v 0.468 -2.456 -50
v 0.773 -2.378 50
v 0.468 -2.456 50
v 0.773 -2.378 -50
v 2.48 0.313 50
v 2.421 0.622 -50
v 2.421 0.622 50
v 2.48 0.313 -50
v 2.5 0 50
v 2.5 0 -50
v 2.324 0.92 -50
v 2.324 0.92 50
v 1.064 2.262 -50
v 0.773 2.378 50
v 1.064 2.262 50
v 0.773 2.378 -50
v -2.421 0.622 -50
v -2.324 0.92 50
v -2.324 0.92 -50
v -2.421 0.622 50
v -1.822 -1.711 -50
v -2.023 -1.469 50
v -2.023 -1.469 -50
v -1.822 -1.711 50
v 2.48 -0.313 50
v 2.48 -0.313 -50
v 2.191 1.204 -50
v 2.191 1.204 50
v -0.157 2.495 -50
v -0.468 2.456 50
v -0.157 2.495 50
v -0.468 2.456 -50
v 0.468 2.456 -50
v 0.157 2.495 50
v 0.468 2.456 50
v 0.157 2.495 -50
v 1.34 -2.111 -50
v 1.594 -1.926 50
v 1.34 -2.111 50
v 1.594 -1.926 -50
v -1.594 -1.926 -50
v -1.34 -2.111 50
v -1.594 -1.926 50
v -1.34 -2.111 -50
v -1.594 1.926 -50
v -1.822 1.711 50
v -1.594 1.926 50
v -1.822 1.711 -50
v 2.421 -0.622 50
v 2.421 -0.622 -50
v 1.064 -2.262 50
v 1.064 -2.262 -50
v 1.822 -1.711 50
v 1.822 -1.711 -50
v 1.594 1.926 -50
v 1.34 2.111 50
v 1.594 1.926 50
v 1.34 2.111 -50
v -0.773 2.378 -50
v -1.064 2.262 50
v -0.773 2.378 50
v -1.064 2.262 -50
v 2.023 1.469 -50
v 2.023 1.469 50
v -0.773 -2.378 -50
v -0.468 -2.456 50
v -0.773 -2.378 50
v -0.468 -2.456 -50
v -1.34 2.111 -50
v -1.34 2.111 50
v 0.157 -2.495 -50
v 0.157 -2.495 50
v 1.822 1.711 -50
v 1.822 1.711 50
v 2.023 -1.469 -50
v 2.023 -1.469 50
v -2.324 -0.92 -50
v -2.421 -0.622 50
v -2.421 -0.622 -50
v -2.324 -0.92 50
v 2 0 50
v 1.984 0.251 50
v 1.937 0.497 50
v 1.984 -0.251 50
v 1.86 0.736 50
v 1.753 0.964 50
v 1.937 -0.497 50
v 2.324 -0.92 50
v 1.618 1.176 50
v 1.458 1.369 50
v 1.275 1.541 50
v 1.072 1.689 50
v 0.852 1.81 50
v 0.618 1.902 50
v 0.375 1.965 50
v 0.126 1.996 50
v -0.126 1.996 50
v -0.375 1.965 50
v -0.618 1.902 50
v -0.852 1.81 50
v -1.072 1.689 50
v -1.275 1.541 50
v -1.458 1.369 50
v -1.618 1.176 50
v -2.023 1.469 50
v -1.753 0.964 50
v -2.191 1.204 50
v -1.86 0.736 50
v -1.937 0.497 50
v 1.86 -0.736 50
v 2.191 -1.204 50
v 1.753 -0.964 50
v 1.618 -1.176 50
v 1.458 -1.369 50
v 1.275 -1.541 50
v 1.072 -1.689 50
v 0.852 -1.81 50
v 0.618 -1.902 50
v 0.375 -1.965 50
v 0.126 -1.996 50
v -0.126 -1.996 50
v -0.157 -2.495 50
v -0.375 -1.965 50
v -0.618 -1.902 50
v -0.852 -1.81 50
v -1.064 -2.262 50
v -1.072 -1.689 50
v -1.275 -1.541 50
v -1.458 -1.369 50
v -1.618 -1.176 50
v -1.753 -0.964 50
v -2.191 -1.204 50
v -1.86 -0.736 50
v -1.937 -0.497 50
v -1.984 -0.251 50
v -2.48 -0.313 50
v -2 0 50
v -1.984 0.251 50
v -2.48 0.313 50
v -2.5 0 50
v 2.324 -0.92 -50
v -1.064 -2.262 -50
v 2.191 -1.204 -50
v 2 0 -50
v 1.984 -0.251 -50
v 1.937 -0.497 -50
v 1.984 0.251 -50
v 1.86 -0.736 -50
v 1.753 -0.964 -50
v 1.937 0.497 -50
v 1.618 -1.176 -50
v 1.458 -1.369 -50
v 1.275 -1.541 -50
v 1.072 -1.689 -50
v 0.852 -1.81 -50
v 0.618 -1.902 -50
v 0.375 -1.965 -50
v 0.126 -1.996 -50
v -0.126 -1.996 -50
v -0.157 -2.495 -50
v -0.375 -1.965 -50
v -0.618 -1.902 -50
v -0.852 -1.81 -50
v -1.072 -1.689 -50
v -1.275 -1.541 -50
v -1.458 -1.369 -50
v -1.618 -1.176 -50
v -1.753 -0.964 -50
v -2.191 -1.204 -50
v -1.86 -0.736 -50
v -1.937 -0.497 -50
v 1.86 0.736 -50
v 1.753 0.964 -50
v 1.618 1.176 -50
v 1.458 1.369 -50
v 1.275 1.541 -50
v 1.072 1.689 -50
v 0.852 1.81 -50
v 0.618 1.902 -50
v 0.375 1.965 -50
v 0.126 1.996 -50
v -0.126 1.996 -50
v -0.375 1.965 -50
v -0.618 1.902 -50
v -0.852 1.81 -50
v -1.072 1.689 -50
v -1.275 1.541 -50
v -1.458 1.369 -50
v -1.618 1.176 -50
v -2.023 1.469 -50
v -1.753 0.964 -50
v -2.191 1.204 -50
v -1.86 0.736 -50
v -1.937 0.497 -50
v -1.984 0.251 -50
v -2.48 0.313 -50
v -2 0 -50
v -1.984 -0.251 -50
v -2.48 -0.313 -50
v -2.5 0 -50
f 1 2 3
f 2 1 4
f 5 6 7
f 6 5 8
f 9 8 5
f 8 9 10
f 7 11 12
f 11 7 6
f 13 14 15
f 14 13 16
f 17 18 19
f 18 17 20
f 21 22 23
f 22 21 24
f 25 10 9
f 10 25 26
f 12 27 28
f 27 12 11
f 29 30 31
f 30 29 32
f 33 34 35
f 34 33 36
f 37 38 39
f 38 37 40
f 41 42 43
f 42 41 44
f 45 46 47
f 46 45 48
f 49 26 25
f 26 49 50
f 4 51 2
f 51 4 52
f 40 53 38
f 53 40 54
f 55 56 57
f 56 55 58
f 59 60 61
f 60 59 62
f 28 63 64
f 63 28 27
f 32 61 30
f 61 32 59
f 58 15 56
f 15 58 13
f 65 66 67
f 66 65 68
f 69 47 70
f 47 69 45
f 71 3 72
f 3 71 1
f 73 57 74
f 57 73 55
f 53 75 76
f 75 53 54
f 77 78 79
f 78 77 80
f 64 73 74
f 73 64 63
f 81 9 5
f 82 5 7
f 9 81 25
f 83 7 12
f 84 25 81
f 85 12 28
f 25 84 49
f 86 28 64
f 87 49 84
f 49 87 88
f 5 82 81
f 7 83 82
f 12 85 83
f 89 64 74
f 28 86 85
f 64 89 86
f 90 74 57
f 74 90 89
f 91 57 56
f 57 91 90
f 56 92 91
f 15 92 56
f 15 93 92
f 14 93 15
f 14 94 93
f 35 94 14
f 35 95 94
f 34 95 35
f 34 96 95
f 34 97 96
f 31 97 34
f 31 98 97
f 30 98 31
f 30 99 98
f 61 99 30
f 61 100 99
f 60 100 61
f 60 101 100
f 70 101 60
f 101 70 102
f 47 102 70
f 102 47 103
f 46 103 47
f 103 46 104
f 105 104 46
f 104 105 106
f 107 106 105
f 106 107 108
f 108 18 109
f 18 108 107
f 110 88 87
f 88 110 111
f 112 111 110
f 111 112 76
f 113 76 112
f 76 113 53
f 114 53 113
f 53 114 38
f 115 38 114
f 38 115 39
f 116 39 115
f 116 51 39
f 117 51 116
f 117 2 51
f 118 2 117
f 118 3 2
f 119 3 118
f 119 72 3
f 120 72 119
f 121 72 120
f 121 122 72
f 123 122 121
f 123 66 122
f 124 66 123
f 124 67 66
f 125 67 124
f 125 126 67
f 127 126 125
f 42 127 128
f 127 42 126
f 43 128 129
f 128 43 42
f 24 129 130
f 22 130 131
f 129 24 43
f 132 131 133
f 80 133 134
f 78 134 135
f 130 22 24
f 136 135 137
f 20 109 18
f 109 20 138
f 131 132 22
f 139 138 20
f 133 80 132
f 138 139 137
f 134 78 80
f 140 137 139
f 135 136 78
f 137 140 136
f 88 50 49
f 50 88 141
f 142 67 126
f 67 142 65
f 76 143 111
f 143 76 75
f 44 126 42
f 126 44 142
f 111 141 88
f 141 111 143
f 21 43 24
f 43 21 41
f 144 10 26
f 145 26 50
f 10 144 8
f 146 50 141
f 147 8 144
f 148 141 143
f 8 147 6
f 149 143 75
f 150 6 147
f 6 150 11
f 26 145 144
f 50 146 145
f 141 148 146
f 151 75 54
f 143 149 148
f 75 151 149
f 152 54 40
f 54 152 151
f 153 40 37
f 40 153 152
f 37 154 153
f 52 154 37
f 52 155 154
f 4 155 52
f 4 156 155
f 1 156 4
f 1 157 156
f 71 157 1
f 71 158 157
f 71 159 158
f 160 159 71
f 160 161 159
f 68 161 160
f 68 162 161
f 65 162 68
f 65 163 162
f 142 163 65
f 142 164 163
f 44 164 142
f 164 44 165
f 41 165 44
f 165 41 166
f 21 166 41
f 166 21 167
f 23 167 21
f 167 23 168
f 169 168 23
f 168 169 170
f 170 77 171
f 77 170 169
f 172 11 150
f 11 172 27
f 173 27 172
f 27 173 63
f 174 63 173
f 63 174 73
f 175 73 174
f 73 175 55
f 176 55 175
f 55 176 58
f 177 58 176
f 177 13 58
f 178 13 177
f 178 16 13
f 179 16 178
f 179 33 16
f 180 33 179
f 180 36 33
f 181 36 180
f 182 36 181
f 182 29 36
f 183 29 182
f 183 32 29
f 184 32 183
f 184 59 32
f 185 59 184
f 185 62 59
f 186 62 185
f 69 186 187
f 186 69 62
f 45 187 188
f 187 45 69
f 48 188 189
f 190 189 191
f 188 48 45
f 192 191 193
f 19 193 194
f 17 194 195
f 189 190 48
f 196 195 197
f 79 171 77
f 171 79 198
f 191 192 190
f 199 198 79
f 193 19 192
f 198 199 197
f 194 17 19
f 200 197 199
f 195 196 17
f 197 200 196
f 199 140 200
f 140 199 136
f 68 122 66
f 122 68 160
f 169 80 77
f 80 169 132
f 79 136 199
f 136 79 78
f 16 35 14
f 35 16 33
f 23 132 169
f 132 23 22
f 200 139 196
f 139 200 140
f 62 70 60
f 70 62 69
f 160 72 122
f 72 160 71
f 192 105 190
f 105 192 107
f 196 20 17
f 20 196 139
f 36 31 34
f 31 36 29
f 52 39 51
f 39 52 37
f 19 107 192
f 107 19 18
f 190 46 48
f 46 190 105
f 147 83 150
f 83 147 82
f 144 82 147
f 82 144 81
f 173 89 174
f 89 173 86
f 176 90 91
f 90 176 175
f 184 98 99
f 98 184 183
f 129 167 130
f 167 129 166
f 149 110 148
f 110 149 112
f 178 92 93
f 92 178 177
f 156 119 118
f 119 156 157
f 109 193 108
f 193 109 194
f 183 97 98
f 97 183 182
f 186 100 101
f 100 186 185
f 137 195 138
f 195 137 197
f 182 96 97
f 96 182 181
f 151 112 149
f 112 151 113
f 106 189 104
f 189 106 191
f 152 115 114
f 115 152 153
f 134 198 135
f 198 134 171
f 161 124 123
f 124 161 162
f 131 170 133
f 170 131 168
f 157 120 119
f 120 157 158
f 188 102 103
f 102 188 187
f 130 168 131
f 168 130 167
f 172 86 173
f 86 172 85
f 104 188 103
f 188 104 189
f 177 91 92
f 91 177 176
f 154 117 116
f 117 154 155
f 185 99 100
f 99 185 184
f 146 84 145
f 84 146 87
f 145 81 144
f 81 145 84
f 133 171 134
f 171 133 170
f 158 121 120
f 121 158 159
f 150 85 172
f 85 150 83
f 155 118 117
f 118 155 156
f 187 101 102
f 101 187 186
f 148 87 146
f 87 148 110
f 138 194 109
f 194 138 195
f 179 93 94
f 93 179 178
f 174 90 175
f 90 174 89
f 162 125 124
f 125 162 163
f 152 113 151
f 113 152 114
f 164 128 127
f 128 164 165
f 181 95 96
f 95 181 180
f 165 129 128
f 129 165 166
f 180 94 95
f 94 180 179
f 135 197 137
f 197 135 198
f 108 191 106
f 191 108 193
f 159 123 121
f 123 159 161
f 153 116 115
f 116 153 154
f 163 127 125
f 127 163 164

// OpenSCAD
$fn = 50;


difference() {
	union() {
		translate(v = [0, 0, -50.0000000000]) {
			cylinder(h = 100, r = 2.5000000000);
		}
	}
	union() {
		translate(v = [0, 0, -100.0000000000]) {
			cylinder(h = 200, r = 2.0000000000);
		}
	}
}
